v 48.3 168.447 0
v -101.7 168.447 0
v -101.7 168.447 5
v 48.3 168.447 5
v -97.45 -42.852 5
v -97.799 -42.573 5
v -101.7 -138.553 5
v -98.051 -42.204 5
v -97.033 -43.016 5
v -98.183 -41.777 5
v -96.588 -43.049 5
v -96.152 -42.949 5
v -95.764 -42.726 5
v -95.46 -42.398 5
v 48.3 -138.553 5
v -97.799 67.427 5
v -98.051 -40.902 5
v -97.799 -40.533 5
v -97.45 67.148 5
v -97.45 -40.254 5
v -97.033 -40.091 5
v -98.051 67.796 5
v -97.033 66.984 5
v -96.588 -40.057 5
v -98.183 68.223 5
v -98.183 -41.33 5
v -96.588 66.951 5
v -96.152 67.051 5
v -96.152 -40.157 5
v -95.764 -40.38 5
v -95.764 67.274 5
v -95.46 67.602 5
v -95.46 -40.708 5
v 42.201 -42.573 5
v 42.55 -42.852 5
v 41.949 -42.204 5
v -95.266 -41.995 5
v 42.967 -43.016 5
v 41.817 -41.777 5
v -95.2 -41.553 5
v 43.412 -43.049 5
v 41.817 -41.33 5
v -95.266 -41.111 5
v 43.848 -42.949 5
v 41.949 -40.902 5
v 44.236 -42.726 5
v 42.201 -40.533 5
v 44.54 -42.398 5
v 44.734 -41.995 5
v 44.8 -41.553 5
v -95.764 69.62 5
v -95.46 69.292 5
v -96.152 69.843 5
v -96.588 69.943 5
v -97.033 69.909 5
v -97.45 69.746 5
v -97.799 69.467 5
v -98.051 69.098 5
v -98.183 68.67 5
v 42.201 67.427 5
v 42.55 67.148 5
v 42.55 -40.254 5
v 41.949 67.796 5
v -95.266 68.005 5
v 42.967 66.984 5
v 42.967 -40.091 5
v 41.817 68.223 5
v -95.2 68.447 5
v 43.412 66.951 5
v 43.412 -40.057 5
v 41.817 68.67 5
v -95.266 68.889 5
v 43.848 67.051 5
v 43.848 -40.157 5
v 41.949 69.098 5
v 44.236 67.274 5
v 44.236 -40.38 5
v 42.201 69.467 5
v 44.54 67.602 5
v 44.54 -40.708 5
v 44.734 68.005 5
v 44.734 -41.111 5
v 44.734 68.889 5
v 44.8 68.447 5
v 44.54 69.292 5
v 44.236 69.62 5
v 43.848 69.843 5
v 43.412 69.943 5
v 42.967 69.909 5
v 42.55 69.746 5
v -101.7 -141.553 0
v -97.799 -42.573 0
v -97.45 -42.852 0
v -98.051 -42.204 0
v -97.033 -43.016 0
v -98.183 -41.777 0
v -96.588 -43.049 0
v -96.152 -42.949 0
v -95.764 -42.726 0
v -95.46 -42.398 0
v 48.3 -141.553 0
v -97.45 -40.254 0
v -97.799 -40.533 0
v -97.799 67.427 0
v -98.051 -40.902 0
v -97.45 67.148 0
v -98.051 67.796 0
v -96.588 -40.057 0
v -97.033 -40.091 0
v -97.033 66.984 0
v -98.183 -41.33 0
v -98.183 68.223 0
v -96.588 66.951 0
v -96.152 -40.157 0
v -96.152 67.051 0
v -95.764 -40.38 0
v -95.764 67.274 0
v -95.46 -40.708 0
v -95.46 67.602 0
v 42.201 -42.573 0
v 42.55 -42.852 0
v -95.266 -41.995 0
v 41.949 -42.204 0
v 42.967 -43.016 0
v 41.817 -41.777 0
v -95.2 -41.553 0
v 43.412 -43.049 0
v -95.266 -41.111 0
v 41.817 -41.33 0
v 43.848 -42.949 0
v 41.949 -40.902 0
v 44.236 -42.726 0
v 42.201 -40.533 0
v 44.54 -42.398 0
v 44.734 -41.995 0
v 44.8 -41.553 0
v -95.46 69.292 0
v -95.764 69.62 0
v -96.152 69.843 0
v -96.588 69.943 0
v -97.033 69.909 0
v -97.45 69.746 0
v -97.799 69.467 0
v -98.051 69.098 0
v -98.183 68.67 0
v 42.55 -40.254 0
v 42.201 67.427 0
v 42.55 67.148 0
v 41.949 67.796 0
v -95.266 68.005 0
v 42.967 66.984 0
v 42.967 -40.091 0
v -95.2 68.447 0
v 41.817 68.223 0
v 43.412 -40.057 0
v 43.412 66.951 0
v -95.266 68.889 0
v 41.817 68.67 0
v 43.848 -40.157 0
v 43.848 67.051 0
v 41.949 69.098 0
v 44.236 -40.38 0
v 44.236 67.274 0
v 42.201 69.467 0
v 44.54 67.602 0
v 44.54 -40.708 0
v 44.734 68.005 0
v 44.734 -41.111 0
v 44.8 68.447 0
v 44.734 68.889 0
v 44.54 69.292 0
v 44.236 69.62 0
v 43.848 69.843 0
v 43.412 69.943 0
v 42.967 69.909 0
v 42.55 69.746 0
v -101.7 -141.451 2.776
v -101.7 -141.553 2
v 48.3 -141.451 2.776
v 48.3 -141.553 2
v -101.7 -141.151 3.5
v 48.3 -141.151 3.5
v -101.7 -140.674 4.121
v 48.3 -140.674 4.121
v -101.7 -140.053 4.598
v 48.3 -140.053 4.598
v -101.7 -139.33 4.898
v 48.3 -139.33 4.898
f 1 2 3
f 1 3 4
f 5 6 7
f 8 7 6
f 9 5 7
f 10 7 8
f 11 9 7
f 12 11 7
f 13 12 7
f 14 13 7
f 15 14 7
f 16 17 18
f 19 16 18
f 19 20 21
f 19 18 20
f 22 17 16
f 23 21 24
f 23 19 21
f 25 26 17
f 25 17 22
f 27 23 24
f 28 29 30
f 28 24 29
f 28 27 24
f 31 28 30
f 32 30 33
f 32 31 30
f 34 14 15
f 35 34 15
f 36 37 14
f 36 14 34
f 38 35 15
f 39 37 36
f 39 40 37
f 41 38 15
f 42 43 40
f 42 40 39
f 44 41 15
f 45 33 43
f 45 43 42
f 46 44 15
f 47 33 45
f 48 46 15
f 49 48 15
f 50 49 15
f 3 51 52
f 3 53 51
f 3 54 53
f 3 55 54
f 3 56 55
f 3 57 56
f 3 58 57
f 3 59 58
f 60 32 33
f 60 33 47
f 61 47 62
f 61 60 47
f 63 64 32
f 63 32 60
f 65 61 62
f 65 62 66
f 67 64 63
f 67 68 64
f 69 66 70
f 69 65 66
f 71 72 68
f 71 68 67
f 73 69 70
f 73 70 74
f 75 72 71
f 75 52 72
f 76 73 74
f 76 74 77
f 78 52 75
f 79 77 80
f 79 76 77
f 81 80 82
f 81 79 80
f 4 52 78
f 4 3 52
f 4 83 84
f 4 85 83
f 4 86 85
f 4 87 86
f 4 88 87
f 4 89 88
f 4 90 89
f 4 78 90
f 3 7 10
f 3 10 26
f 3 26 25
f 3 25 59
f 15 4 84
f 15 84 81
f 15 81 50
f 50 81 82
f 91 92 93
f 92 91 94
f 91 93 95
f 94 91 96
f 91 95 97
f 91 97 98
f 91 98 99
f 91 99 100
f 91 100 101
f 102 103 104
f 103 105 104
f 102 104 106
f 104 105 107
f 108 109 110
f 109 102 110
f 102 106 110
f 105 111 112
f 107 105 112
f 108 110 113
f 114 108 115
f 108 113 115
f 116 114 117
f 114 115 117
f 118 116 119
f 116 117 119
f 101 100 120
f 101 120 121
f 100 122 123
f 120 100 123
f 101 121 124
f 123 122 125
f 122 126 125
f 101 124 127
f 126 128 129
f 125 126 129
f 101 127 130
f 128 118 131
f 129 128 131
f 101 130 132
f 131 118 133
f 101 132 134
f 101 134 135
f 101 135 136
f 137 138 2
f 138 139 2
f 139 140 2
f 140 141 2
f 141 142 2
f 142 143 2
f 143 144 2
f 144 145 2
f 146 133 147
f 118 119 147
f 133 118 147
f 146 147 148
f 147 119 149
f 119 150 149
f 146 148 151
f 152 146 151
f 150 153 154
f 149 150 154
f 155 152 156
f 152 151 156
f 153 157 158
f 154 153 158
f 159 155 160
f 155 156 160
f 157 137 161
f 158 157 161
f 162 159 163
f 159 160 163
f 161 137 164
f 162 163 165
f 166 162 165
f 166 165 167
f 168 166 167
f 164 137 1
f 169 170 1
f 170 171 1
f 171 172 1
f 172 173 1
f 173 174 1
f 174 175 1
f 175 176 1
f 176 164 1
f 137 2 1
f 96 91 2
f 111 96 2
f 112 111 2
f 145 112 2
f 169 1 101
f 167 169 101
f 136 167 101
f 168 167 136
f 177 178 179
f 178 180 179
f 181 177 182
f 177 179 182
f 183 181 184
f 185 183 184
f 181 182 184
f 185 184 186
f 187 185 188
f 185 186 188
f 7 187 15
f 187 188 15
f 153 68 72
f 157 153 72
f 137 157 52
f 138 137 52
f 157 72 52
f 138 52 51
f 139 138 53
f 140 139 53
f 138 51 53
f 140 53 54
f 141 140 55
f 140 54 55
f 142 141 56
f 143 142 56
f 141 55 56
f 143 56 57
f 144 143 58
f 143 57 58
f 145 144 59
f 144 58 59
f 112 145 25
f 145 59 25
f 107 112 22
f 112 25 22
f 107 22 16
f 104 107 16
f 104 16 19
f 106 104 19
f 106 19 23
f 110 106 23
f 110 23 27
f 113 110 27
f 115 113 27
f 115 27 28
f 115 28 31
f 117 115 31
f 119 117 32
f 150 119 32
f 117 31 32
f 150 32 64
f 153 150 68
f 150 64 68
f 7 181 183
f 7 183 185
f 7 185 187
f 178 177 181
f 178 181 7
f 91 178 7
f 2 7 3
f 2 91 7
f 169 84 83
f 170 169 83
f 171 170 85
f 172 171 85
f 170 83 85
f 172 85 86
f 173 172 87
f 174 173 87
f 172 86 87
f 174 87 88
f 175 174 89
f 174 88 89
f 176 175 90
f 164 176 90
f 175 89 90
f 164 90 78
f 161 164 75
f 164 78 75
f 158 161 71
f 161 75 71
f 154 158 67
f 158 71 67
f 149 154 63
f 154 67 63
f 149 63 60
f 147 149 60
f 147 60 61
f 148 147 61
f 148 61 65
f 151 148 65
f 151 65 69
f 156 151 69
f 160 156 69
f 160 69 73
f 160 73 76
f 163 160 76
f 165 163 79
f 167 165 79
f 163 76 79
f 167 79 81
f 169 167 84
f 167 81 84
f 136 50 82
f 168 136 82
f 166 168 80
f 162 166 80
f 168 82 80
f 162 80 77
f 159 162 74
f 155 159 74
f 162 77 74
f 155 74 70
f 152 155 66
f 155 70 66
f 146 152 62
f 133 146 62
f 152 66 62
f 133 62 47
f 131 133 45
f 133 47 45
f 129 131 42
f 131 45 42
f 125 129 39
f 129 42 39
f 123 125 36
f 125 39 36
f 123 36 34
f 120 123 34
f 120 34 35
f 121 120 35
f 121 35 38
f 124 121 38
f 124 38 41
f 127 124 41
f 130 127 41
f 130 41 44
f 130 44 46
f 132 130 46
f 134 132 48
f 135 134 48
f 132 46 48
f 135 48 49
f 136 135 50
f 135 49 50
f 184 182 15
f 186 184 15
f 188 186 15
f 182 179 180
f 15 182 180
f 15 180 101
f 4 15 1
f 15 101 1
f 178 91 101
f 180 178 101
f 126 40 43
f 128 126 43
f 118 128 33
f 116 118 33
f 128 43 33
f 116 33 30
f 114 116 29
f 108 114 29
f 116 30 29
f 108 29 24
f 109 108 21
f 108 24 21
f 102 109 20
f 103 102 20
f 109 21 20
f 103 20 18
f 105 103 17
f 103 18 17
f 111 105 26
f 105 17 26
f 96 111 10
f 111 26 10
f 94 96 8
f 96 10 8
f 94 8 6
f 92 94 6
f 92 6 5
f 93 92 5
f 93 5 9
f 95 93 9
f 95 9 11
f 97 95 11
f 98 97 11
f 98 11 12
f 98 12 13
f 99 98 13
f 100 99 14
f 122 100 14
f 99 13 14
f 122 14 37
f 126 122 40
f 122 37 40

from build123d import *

# Parameters (mm, degrees)
F0_W     = 150
F0_H     = 310
F1_DEPTH = 5
F2_R     = 1.5
F3_DEPTH = 5
F4_R     = 3


with BuildPart() as f1:
    # F0 (on Top) → F1 (new body)
    with BuildSketch(Plane.XY):
        with Locations((-26.699642, 13.446885)):
            Rectangle(F0_W, F0_H)
    extrude(amount=F1_DEPTH)

    # F2 (on face) → F3 (cut, through all)
    with BuildSketch(Plane.XY.offset(5)):
        with Locations((-96.699642, 68.446885)):
            Circle(F2_R)
        with Locations((-96.699642, -41.553115)):
            Circle(F2_R)
        with Locations((43.300358, -41.553115)):
            Circle(F2_R)
        with Locations((43.300358, 68.446885)):
            Circle(F2_R)
    extrude(amount=-F3_DEPTH, mode=Mode.SUBTRACT)

    # F4
    f4_edges = [f1.edges().sort_by_distance(p)[0] for p in [
        (-26.699642, -141.553115, 5),
    ]]
    fillet(f4_edges, radius=F4_R)


solid = f1.part
